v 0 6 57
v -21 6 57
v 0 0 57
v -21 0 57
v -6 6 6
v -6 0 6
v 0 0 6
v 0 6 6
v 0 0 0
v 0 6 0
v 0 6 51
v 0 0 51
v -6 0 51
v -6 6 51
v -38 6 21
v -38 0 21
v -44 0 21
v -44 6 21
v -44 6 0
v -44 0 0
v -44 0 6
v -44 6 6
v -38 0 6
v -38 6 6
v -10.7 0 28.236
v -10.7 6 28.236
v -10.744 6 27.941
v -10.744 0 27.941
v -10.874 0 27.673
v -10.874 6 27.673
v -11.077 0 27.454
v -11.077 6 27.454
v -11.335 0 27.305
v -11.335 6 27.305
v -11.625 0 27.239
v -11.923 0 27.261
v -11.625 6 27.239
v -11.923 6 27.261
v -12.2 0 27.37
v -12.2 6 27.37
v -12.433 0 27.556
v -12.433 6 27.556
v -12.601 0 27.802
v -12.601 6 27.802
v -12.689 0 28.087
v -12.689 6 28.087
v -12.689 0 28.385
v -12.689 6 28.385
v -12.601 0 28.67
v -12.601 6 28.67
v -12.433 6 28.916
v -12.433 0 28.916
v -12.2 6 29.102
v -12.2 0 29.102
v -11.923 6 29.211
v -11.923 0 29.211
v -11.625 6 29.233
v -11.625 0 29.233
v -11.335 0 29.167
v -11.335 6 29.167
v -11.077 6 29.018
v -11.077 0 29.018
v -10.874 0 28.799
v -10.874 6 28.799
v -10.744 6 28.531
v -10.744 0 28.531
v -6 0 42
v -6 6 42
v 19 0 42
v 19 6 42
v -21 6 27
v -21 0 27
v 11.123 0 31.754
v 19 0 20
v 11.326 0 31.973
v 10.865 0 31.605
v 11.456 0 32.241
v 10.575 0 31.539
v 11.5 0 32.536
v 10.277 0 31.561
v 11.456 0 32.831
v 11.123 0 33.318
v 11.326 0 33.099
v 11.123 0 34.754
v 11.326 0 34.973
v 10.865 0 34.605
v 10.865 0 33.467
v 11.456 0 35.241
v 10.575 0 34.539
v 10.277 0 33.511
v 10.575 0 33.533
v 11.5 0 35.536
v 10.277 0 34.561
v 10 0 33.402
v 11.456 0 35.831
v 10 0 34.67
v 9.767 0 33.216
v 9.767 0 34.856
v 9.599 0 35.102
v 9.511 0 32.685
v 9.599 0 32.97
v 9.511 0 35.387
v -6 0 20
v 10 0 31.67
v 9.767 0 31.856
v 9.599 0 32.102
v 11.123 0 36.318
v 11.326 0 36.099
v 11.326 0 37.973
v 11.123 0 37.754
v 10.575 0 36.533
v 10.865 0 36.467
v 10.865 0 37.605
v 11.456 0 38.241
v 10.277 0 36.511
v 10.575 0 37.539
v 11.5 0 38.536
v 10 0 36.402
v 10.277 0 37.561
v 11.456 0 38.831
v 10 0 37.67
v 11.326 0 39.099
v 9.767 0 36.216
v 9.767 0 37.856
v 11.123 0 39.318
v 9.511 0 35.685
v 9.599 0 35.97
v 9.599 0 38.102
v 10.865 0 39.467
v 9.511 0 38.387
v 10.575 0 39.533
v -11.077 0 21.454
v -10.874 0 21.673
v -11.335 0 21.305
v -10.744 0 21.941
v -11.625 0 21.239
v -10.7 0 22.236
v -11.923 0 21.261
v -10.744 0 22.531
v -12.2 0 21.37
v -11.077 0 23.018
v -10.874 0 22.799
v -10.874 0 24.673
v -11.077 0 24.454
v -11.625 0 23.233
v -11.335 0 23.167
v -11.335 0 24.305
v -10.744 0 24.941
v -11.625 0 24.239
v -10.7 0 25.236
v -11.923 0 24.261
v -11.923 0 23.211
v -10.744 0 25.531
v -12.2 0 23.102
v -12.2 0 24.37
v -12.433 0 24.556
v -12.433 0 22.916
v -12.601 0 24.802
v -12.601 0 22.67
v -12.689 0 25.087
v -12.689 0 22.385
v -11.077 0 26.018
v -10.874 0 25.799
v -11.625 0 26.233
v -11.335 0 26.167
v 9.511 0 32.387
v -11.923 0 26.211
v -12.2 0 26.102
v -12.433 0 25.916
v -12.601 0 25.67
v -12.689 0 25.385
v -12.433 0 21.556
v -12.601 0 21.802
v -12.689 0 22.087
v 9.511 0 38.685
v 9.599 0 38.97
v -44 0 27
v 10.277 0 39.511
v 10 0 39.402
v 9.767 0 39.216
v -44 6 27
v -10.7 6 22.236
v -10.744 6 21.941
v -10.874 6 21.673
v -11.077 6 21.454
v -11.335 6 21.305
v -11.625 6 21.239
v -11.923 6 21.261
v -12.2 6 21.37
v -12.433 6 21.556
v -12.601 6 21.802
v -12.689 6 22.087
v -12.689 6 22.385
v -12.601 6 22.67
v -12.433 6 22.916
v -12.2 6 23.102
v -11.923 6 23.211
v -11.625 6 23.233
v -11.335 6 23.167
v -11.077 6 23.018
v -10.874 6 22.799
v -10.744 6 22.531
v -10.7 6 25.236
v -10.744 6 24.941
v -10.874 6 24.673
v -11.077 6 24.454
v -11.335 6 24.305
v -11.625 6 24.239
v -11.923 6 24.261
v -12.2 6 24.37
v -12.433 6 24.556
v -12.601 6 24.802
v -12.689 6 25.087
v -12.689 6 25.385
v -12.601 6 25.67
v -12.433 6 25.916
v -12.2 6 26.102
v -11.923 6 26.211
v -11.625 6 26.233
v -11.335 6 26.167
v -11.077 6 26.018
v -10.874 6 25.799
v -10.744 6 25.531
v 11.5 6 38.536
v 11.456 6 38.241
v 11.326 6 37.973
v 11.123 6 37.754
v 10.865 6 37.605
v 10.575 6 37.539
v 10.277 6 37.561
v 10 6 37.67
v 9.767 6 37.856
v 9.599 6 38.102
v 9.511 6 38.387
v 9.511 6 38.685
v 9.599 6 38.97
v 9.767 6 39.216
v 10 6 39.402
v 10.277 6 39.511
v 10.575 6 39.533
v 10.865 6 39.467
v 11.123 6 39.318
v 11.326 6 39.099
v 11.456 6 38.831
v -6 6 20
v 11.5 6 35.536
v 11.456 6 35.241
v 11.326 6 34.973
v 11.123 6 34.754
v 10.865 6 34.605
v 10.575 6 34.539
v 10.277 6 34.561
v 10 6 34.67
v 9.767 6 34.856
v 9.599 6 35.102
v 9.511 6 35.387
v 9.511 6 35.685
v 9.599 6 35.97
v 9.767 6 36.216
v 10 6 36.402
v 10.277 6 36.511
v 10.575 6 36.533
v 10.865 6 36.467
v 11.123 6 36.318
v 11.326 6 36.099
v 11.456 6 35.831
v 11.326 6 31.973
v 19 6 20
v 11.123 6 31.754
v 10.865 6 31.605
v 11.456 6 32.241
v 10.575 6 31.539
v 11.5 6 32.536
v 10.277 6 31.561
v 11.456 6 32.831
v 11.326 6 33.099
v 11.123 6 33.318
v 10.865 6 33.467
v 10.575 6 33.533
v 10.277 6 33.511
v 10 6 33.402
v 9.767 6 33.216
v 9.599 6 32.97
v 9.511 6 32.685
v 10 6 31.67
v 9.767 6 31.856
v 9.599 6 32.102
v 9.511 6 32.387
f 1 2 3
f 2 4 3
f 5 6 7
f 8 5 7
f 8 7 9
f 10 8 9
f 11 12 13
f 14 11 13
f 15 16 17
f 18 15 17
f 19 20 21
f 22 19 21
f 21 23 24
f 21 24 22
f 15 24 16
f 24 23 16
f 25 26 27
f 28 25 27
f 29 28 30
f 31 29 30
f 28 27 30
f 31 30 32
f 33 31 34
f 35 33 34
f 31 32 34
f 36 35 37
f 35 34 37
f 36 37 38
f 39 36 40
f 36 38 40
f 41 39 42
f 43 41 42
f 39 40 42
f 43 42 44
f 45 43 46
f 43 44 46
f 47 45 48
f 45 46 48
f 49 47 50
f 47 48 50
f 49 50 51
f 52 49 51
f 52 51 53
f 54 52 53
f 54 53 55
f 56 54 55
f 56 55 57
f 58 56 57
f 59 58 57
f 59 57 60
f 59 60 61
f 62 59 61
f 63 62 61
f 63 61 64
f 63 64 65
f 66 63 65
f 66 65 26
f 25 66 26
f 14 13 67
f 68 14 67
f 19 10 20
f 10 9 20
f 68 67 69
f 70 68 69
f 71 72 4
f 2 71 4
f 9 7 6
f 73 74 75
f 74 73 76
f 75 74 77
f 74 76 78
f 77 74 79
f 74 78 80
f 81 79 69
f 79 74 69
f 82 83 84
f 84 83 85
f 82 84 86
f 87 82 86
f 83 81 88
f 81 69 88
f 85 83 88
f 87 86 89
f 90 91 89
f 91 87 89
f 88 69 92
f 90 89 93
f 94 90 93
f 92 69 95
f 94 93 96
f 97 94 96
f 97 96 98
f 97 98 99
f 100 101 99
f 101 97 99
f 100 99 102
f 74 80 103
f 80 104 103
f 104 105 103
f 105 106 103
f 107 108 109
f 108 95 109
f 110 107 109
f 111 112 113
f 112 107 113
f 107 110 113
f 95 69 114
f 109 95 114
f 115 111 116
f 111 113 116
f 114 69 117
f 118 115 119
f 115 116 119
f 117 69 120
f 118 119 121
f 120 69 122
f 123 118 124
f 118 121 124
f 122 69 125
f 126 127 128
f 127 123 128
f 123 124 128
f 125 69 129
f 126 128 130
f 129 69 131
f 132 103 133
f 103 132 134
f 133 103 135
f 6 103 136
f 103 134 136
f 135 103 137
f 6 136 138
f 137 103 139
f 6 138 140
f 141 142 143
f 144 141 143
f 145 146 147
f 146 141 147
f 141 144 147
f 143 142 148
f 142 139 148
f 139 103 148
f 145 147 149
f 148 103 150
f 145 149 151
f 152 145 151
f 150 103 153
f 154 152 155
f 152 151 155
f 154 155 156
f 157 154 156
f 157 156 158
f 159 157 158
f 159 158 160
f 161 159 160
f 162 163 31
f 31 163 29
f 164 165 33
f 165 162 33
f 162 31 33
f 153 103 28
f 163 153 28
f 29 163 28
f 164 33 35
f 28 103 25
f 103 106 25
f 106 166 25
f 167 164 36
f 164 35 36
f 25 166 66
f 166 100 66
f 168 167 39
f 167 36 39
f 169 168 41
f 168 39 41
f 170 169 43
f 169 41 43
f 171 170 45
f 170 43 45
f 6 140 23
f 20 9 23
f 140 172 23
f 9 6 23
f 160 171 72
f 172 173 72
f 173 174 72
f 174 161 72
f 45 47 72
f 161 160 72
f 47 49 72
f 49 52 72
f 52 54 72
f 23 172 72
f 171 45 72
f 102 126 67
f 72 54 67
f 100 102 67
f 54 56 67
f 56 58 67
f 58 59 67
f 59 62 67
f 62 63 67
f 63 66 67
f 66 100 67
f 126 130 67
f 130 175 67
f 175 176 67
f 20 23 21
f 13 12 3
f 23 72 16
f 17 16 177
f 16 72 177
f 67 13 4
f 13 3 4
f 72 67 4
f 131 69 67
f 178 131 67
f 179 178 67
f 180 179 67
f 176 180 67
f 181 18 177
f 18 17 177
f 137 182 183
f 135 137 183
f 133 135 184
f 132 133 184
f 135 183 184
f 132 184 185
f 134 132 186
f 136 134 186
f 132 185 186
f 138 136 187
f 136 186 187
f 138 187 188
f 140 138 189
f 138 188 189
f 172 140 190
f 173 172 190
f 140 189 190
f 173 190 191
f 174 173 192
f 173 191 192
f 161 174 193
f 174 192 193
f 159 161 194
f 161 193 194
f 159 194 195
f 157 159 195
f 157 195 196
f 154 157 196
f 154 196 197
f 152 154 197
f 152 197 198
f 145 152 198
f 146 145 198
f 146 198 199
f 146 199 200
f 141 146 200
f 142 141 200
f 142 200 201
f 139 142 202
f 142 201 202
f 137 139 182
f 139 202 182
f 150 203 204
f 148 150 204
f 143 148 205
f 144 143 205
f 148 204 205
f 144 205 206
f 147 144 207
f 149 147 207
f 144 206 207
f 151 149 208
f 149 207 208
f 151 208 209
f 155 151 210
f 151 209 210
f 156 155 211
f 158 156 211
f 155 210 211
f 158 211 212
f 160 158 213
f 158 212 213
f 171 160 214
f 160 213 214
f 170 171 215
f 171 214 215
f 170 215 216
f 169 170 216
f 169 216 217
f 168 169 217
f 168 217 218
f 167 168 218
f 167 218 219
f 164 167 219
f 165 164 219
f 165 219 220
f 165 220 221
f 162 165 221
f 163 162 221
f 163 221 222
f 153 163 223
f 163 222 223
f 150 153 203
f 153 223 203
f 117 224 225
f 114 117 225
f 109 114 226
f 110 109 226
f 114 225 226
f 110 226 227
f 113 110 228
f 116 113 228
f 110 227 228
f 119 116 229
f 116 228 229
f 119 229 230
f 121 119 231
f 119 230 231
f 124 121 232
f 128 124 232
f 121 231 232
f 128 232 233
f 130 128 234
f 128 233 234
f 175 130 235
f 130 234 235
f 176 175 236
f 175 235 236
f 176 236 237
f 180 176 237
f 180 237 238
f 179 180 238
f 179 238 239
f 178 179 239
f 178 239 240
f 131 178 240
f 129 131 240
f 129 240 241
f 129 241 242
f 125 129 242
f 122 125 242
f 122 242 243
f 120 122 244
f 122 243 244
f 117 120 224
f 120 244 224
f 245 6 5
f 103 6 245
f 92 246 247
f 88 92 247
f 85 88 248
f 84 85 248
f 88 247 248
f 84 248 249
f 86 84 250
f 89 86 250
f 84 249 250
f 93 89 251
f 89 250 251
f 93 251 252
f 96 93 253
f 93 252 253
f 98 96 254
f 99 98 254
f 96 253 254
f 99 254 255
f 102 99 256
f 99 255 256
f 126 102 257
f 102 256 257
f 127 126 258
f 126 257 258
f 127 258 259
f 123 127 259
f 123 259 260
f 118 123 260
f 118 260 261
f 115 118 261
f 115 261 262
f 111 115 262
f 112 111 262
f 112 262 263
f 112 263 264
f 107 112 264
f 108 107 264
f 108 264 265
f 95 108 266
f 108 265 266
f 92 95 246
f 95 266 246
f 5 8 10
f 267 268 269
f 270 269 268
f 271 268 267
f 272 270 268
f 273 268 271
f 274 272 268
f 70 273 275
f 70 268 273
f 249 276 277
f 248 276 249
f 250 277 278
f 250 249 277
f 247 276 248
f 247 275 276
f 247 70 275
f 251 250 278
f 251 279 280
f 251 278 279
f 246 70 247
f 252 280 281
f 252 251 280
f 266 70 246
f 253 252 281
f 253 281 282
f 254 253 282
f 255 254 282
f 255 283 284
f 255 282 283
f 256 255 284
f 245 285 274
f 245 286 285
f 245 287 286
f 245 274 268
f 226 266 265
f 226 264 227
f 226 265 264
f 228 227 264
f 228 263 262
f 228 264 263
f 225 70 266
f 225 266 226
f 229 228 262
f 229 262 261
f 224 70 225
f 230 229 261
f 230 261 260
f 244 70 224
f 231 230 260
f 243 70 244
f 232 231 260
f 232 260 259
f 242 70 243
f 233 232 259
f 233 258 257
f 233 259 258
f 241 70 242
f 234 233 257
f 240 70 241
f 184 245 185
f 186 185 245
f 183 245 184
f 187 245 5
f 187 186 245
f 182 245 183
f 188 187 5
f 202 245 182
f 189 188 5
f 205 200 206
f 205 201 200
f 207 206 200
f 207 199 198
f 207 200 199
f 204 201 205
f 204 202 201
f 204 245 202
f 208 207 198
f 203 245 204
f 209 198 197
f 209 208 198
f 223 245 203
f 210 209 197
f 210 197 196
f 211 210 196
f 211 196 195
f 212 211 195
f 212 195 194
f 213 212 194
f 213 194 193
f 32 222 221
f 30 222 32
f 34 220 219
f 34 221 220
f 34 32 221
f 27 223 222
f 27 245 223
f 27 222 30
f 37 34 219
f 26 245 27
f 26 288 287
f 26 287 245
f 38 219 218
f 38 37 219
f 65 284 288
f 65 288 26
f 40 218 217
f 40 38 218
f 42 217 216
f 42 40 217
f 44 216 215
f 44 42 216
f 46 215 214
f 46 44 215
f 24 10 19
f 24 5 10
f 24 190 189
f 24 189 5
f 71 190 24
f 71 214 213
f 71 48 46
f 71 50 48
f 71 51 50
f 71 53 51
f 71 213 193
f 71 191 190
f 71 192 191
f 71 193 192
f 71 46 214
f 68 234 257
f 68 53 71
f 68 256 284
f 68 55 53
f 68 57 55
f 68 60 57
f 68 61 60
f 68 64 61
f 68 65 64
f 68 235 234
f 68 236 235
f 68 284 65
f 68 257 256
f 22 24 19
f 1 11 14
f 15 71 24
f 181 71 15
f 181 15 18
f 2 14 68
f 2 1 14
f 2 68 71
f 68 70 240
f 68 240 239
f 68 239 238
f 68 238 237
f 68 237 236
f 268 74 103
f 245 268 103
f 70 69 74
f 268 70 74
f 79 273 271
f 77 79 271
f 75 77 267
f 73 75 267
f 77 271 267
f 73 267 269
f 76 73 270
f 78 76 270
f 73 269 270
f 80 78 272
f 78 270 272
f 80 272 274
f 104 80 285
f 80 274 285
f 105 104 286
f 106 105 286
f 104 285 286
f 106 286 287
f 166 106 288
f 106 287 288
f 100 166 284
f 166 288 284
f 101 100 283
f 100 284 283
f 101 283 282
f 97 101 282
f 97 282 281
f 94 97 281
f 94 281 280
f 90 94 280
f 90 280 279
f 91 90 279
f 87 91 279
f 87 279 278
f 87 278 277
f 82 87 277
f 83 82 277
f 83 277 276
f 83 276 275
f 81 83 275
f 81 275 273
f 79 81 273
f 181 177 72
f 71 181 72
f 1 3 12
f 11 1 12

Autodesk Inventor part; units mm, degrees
ref_plane "YZ Plane" through (0, 0, 0) normal (1, 0, 0) x (0, 1, 0)
ref_plane "XZ Plane" through (0, 0, 0) normal (0, 1, 0) x (-1, 0, 0)
ref_plane "XY Plane" through (0, 0, 0) normal (0, 0, 1) x (1, 0, 0)
sketch "Sketch1" plane through (0, 0, 0) normal (0, 1, 0) x (-1, 0, 0)
  line L0 (0, 0) -> (38, 0)
  line L1 (44, 0) -> (44, 6)
  line L2 (44, 27) -> (38, 27)
  line L3 (0, 27) -> (0, 6) construction
  line L4 (44, 27) -> (38, 27)
  line L5 (38, 27) -> (38, 21) construction
  line L6 (38, 21) -> (44, 21)
  line L7 (44, 21) -> (44, 27)
  line L8 (44, 0) -> (38, 0)
  line L9 (38, 0) -> (38, 6) construction
  line L10 (38, 6) -> (44, 6)
  line L11 (44, 6) -> (44, 0)
  line L12 (44, 21) -> (44, 27)
  line L13 (38, 27) -> (6, 27)
  line L14 (38, 0) -> (44, 0)
  line L15 (44, 6) -> (44, 21) construction
  line L16 (38, 6) -> (38, 21)
  line L17 (0, 0) -> (6, 0)
  line L18 (6, 0) -> (6, 6) construction
  line L19 (6, 6) -> (0, 6)
  line L20 (0, 6) -> (0, 0)
  line L21 (6, 6) -> (6, 27)
  line L22 (6, 27) -> (0, 27) construction
  line L23 (0, 6) -> (0, 0)
  line L24 (6, 27) -> (21, 27)
  line L25 (21, 27) -> (21, 57)
  line L26 (21, 57) -> (6, 57)
  line L27 (6, 57) -> (0, 57)
  line L28 (0, 57) -> (0, 51)
  line L29 (0, 51) -> (6, 51)
  line L30 (6, 51) -> (6, 57) construction
  line L31 (6, 51) -> (6, 27)
  line L32 (6, 42) -> (-19, 42)
  line L33 (-19, 42) -> (-19, 20)
  line L34 (-19, 20) -> (6, 20)
  line L35 (6, 20) -> (6, 42)
  dimension "d0" = 44
  dimension "d1" = 27
  dimension "d2" = 6
  dimension "d3" = 6
  dimension "d4" = 6
  dimension "d5" = 6
  dimension "d6" = 6
  dimension "d7" = 6
  dimension "d10" = 15
  dimension "d11" = 30
  dimension "d12" = 6
  dimension "d13" = 6
  dimension "d34" = 25
  dimension "d35" = 22
  dimension "d36" = 9
extrude "Extrusion1" add sketch "Sketch1" along normal blind 6
sketch "Sketch2" plane through (0, 6, 0) normal (0, 1, 0) x (1, 0, 0)
  circle A0 centre (10.5, -38.536) radius 1
  circle A1 centre (10.5, -35.536) radius 1
  circle A2 centre (10.5, -32.536) radius 1
  circle A3 centre (-11.7, -28.236) radius 1
  circle A4 centre (-11.7, -25.236) radius 1
  circle A5 centre (-11.7, -22.236) radius 1
  line L0 (0, -51) -> (-6, -51) projected
  line L1 (19, -42) -> (19, -20) projected
  dimension "d22" = 2
  dimension "d24" = 2
  dimension "d25" = 3
  dimension "d26" = 2
  dimension "d27" = 3
  dimension "d28" = 2
  dimension "d29" = 2
  dimension "d30" = 3
  dimension "d31" = 2
  dimension "d32" = 3
  dimension "d37" = 10.3
  dimension "d39" = 22.2
  dimension "d51" = 12.464
  dimension "d57" = 8.5
extrude "Extrusion2" cut sketch "Sketch2" against normal through all
properties part number "thumper-bumper-sidewall3-v3"
